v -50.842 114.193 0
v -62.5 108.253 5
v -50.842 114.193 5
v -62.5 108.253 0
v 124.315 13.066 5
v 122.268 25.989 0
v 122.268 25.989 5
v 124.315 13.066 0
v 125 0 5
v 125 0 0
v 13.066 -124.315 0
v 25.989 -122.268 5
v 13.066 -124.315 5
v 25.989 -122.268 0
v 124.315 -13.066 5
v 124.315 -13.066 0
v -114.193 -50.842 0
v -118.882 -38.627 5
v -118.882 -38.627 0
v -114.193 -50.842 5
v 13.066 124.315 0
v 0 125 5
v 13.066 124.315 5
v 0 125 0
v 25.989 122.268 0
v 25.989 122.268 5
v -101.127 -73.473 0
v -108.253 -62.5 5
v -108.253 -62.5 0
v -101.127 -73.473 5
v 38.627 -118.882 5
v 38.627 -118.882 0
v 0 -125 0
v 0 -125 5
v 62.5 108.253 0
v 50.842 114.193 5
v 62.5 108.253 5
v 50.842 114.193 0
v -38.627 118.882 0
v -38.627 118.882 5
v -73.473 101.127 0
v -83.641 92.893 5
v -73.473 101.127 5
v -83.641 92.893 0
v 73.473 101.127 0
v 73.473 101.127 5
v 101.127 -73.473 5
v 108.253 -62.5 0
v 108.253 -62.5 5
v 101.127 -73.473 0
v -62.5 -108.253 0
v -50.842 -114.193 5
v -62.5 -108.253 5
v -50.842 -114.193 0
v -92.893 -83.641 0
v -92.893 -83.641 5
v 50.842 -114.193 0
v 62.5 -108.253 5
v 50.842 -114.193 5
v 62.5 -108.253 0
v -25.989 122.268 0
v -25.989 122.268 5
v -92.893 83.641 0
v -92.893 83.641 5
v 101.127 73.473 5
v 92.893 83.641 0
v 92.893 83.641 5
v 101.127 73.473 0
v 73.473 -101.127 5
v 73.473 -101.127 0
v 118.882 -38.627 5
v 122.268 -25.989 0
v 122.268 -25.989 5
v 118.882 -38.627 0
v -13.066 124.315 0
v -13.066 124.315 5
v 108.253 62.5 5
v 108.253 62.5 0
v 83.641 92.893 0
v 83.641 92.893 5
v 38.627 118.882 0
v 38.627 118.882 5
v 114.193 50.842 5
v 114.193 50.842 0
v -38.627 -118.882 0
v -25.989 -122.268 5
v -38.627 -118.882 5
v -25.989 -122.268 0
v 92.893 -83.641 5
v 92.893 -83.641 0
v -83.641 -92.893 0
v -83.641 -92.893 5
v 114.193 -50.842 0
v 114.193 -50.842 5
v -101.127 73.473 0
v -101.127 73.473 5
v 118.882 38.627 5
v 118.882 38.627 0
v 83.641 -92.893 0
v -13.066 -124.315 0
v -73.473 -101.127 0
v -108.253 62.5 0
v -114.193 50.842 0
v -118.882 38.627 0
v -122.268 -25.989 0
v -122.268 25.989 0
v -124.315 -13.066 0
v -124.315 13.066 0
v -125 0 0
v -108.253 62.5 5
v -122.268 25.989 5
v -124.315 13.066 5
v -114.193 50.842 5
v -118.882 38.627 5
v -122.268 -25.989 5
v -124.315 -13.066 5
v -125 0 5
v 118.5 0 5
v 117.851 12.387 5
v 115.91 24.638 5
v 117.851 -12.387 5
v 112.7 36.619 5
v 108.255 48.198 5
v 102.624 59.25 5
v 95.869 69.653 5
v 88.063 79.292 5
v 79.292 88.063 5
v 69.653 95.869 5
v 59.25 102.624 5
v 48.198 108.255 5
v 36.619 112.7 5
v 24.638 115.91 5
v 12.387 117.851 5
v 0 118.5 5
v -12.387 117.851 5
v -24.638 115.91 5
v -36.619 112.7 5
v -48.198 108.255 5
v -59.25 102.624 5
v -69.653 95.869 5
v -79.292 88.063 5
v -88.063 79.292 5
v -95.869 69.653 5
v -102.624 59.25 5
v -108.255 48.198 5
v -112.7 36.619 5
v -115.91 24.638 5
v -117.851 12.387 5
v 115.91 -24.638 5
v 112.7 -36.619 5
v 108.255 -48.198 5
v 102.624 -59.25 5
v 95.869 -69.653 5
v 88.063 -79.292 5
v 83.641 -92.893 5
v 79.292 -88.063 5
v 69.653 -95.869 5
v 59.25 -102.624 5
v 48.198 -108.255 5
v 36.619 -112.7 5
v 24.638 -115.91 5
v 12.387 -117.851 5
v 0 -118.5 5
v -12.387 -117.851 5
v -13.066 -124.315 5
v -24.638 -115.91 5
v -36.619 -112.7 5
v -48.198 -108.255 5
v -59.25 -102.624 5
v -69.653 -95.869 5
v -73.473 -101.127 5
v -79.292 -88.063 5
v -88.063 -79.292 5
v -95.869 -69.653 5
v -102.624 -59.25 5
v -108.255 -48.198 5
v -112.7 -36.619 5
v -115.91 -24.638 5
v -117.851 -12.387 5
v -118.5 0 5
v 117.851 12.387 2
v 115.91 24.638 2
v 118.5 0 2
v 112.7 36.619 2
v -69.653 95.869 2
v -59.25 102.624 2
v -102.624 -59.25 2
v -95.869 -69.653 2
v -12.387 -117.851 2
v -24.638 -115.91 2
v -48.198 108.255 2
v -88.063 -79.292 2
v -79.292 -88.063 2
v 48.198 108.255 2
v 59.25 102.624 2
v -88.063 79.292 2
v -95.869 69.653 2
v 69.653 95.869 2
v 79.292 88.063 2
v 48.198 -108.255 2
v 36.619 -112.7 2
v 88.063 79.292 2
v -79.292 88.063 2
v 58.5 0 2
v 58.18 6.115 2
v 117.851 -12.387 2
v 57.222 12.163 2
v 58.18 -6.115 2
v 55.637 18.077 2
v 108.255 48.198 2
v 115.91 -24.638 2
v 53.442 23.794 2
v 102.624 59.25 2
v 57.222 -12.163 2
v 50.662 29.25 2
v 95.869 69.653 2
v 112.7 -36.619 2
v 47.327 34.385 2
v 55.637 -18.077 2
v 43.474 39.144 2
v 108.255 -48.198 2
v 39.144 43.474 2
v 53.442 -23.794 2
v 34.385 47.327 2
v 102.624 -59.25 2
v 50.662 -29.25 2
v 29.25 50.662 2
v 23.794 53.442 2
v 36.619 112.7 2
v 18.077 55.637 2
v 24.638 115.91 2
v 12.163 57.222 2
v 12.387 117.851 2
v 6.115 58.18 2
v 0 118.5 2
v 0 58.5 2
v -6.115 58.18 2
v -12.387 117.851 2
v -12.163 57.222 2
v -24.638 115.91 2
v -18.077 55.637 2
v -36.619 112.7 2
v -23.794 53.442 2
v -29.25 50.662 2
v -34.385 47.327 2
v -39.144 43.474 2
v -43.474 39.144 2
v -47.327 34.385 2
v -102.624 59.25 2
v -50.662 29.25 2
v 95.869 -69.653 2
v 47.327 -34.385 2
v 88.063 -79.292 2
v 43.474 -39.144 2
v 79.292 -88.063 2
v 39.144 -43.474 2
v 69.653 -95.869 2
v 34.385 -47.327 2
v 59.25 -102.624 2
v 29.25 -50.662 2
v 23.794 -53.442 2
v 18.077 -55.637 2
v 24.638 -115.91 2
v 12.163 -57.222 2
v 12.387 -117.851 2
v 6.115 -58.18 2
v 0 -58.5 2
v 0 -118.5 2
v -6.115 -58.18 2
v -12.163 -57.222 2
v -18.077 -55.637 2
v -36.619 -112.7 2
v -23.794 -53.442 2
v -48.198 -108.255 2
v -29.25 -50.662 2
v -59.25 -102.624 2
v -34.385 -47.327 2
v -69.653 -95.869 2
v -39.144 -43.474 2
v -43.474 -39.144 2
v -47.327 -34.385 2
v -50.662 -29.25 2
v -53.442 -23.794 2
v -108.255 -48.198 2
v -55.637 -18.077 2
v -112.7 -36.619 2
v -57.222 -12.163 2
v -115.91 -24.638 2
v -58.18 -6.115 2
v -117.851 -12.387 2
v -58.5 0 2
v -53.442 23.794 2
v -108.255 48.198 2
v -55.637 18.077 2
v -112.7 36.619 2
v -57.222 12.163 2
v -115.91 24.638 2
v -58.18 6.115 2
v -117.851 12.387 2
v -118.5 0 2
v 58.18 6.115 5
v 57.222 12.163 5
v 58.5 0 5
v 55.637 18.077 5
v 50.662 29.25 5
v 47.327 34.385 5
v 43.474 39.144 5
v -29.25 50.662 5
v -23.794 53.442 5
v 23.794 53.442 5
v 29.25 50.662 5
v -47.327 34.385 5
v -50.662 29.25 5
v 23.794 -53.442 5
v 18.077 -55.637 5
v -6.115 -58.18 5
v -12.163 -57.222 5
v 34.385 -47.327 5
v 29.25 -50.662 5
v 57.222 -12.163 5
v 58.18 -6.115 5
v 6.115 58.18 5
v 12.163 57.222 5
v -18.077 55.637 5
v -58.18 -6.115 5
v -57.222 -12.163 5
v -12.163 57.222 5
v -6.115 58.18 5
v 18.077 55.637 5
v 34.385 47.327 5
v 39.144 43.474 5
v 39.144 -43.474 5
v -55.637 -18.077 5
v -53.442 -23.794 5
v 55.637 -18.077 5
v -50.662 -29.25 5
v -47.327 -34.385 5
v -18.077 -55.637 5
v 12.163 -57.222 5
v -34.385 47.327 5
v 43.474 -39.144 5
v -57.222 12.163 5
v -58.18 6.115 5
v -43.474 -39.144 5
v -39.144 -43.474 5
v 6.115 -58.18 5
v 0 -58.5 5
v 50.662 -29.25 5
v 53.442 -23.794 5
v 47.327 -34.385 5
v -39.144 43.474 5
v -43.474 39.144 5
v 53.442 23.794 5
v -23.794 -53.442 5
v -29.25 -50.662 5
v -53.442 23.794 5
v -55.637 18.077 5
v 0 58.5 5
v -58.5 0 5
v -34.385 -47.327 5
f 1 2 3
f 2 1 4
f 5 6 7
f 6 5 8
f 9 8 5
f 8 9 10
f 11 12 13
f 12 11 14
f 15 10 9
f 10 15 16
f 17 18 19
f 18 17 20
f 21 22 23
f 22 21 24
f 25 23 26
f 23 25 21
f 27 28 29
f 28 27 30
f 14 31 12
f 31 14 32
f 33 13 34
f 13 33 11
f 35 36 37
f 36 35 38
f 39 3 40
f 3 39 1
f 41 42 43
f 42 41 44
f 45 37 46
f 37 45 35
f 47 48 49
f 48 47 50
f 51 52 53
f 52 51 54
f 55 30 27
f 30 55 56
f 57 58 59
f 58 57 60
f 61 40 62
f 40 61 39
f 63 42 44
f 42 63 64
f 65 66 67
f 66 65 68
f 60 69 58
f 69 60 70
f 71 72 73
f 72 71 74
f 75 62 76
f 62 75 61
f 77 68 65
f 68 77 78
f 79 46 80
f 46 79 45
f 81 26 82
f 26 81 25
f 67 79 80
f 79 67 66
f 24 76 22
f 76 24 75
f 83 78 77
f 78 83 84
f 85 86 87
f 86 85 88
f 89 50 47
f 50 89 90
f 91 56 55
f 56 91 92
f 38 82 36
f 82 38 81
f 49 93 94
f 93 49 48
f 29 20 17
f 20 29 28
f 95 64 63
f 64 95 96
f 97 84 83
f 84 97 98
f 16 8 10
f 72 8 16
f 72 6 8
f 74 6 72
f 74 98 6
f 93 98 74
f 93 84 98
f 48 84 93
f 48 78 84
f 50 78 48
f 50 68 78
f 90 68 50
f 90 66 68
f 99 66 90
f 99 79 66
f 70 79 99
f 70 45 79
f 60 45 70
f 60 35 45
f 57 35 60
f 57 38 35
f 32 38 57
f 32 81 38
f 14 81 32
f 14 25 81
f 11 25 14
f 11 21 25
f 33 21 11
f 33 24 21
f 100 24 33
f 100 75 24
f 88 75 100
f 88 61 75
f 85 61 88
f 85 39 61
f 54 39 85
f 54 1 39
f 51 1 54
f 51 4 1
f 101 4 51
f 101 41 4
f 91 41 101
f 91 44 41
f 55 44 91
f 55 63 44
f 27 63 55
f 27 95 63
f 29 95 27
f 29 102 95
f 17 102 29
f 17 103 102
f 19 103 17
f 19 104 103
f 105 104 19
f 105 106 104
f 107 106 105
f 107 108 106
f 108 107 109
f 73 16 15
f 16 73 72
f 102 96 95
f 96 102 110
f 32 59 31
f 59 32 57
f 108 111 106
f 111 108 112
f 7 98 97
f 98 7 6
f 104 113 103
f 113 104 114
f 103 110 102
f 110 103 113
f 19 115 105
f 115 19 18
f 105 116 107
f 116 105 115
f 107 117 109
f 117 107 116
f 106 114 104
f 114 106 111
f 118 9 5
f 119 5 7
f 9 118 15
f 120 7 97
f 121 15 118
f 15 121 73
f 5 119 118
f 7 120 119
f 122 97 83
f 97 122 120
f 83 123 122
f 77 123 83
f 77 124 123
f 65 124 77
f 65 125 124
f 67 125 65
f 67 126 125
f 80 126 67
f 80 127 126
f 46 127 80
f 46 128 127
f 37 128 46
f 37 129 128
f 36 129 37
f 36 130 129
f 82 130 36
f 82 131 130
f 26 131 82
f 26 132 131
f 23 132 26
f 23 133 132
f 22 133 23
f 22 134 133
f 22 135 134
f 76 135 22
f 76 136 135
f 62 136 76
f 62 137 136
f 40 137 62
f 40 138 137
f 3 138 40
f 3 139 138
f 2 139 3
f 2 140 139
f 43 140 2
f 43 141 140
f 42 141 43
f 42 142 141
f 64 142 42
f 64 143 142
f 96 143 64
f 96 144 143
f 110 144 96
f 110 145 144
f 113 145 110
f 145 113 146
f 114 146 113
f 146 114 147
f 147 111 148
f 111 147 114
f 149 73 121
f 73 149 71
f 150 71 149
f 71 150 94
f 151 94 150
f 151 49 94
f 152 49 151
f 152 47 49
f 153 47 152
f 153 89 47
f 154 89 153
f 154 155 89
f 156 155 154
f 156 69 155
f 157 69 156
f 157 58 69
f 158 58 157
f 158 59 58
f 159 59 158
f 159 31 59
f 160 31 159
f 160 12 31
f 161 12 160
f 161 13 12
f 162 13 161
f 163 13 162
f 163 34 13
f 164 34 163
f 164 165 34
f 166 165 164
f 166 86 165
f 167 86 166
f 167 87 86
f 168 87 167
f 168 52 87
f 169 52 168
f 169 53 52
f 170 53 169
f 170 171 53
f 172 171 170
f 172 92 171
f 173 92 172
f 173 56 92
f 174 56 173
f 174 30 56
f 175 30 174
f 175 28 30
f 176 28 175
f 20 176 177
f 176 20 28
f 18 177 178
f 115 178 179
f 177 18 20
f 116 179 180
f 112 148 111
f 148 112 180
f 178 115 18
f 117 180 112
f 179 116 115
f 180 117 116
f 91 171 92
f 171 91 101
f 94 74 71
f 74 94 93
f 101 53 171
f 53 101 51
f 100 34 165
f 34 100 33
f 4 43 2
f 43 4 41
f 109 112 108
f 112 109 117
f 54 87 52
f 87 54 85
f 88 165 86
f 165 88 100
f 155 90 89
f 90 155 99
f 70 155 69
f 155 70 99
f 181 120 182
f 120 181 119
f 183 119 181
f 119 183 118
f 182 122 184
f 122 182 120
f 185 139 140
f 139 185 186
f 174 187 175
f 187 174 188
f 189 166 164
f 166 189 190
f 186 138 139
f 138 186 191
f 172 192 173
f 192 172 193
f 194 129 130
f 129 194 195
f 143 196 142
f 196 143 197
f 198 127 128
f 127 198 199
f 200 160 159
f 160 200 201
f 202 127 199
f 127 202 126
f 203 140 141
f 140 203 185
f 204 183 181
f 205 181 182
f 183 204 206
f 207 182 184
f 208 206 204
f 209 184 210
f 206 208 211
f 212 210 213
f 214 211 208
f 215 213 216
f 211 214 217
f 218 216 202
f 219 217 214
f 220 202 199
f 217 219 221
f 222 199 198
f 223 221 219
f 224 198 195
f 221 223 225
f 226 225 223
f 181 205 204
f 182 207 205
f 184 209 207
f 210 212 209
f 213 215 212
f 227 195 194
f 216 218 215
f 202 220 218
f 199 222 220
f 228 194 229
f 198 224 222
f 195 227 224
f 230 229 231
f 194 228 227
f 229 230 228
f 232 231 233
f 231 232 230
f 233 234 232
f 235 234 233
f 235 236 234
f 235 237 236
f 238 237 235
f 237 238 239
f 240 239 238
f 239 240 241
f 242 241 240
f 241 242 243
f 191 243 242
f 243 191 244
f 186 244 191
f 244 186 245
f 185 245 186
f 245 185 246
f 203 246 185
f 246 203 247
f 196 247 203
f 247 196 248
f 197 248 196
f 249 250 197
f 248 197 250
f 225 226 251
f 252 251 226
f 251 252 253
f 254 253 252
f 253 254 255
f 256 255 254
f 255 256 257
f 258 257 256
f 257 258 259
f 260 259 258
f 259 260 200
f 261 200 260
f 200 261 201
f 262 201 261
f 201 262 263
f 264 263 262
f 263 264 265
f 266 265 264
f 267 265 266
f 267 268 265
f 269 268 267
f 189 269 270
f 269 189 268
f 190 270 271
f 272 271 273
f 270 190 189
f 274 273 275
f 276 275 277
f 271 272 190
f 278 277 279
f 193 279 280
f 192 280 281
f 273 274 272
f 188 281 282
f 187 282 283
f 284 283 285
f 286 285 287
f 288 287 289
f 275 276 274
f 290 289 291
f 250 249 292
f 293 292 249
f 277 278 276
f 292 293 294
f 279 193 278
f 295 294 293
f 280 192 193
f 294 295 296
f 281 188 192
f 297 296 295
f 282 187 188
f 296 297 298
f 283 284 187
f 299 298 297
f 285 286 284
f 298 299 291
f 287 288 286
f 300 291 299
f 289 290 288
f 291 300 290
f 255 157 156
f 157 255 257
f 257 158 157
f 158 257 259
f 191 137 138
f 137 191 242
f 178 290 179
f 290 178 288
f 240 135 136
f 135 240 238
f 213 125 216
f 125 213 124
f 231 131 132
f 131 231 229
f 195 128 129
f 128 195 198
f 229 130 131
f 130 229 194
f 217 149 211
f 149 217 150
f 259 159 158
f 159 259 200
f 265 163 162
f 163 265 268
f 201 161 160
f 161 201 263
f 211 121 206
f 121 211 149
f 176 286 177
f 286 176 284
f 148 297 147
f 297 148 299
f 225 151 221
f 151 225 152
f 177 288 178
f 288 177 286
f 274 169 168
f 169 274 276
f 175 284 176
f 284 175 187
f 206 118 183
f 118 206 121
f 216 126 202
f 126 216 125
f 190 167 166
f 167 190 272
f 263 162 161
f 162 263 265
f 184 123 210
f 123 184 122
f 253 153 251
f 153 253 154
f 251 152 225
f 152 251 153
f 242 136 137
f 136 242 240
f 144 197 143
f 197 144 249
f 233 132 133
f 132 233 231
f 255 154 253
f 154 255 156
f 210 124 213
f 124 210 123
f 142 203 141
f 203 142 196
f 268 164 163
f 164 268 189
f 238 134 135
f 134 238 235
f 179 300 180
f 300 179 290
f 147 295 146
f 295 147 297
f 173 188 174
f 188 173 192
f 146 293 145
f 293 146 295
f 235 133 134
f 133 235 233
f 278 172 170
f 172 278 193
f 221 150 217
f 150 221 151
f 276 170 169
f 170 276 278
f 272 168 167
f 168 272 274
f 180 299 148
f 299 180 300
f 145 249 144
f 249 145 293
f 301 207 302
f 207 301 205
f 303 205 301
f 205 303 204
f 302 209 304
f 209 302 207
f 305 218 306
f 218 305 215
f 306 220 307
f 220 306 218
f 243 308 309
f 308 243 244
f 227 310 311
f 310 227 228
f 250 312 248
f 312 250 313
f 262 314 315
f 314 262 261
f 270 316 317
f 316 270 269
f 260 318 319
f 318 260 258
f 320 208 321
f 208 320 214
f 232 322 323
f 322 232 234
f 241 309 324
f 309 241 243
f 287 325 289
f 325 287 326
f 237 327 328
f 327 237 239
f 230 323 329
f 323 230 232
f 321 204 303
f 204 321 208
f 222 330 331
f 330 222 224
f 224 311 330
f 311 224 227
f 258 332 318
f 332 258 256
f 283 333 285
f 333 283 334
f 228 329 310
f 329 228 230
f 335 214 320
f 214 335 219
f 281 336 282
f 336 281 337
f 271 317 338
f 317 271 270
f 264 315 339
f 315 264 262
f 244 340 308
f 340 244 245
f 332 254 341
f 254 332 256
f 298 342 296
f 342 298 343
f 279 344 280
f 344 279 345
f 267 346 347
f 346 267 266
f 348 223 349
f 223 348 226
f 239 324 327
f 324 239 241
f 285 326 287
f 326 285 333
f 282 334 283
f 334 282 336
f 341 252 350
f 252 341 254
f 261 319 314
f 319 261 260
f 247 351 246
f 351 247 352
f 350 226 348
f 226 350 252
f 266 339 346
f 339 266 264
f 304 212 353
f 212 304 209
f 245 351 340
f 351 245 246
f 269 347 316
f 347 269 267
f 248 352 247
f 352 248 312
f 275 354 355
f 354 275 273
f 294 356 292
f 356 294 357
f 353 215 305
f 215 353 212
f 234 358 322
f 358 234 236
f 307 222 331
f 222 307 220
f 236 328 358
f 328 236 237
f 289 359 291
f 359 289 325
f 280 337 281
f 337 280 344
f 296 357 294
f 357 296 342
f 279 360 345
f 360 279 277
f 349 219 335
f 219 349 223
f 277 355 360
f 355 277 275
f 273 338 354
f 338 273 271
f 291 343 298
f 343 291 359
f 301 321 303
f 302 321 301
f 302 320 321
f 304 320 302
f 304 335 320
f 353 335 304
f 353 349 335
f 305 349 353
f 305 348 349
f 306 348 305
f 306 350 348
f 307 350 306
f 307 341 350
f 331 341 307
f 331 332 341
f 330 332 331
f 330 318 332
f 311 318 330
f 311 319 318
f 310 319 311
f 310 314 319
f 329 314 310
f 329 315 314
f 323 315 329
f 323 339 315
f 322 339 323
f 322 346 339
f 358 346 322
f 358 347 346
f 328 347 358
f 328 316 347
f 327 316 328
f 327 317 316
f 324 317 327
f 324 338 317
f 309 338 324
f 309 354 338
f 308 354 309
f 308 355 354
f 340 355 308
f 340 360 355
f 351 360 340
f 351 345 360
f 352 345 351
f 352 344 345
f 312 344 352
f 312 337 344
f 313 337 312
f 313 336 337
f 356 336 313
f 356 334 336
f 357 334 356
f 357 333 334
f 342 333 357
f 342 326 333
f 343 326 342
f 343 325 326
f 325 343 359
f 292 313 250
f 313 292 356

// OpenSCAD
//flybase

module platform(
plat_d=117,
h=5,
moat_w=60,
outer_d=250,
fn=60){
    $fn = fn;
    difference(){
        cylinder(h=h,d=outer_d);
        translate([0,0,2])cylinder(h=h,d=plat_d+moat_w*2);
    }// difference
    cylinder(h=h,d=plat_d);
}// platform

platform();
